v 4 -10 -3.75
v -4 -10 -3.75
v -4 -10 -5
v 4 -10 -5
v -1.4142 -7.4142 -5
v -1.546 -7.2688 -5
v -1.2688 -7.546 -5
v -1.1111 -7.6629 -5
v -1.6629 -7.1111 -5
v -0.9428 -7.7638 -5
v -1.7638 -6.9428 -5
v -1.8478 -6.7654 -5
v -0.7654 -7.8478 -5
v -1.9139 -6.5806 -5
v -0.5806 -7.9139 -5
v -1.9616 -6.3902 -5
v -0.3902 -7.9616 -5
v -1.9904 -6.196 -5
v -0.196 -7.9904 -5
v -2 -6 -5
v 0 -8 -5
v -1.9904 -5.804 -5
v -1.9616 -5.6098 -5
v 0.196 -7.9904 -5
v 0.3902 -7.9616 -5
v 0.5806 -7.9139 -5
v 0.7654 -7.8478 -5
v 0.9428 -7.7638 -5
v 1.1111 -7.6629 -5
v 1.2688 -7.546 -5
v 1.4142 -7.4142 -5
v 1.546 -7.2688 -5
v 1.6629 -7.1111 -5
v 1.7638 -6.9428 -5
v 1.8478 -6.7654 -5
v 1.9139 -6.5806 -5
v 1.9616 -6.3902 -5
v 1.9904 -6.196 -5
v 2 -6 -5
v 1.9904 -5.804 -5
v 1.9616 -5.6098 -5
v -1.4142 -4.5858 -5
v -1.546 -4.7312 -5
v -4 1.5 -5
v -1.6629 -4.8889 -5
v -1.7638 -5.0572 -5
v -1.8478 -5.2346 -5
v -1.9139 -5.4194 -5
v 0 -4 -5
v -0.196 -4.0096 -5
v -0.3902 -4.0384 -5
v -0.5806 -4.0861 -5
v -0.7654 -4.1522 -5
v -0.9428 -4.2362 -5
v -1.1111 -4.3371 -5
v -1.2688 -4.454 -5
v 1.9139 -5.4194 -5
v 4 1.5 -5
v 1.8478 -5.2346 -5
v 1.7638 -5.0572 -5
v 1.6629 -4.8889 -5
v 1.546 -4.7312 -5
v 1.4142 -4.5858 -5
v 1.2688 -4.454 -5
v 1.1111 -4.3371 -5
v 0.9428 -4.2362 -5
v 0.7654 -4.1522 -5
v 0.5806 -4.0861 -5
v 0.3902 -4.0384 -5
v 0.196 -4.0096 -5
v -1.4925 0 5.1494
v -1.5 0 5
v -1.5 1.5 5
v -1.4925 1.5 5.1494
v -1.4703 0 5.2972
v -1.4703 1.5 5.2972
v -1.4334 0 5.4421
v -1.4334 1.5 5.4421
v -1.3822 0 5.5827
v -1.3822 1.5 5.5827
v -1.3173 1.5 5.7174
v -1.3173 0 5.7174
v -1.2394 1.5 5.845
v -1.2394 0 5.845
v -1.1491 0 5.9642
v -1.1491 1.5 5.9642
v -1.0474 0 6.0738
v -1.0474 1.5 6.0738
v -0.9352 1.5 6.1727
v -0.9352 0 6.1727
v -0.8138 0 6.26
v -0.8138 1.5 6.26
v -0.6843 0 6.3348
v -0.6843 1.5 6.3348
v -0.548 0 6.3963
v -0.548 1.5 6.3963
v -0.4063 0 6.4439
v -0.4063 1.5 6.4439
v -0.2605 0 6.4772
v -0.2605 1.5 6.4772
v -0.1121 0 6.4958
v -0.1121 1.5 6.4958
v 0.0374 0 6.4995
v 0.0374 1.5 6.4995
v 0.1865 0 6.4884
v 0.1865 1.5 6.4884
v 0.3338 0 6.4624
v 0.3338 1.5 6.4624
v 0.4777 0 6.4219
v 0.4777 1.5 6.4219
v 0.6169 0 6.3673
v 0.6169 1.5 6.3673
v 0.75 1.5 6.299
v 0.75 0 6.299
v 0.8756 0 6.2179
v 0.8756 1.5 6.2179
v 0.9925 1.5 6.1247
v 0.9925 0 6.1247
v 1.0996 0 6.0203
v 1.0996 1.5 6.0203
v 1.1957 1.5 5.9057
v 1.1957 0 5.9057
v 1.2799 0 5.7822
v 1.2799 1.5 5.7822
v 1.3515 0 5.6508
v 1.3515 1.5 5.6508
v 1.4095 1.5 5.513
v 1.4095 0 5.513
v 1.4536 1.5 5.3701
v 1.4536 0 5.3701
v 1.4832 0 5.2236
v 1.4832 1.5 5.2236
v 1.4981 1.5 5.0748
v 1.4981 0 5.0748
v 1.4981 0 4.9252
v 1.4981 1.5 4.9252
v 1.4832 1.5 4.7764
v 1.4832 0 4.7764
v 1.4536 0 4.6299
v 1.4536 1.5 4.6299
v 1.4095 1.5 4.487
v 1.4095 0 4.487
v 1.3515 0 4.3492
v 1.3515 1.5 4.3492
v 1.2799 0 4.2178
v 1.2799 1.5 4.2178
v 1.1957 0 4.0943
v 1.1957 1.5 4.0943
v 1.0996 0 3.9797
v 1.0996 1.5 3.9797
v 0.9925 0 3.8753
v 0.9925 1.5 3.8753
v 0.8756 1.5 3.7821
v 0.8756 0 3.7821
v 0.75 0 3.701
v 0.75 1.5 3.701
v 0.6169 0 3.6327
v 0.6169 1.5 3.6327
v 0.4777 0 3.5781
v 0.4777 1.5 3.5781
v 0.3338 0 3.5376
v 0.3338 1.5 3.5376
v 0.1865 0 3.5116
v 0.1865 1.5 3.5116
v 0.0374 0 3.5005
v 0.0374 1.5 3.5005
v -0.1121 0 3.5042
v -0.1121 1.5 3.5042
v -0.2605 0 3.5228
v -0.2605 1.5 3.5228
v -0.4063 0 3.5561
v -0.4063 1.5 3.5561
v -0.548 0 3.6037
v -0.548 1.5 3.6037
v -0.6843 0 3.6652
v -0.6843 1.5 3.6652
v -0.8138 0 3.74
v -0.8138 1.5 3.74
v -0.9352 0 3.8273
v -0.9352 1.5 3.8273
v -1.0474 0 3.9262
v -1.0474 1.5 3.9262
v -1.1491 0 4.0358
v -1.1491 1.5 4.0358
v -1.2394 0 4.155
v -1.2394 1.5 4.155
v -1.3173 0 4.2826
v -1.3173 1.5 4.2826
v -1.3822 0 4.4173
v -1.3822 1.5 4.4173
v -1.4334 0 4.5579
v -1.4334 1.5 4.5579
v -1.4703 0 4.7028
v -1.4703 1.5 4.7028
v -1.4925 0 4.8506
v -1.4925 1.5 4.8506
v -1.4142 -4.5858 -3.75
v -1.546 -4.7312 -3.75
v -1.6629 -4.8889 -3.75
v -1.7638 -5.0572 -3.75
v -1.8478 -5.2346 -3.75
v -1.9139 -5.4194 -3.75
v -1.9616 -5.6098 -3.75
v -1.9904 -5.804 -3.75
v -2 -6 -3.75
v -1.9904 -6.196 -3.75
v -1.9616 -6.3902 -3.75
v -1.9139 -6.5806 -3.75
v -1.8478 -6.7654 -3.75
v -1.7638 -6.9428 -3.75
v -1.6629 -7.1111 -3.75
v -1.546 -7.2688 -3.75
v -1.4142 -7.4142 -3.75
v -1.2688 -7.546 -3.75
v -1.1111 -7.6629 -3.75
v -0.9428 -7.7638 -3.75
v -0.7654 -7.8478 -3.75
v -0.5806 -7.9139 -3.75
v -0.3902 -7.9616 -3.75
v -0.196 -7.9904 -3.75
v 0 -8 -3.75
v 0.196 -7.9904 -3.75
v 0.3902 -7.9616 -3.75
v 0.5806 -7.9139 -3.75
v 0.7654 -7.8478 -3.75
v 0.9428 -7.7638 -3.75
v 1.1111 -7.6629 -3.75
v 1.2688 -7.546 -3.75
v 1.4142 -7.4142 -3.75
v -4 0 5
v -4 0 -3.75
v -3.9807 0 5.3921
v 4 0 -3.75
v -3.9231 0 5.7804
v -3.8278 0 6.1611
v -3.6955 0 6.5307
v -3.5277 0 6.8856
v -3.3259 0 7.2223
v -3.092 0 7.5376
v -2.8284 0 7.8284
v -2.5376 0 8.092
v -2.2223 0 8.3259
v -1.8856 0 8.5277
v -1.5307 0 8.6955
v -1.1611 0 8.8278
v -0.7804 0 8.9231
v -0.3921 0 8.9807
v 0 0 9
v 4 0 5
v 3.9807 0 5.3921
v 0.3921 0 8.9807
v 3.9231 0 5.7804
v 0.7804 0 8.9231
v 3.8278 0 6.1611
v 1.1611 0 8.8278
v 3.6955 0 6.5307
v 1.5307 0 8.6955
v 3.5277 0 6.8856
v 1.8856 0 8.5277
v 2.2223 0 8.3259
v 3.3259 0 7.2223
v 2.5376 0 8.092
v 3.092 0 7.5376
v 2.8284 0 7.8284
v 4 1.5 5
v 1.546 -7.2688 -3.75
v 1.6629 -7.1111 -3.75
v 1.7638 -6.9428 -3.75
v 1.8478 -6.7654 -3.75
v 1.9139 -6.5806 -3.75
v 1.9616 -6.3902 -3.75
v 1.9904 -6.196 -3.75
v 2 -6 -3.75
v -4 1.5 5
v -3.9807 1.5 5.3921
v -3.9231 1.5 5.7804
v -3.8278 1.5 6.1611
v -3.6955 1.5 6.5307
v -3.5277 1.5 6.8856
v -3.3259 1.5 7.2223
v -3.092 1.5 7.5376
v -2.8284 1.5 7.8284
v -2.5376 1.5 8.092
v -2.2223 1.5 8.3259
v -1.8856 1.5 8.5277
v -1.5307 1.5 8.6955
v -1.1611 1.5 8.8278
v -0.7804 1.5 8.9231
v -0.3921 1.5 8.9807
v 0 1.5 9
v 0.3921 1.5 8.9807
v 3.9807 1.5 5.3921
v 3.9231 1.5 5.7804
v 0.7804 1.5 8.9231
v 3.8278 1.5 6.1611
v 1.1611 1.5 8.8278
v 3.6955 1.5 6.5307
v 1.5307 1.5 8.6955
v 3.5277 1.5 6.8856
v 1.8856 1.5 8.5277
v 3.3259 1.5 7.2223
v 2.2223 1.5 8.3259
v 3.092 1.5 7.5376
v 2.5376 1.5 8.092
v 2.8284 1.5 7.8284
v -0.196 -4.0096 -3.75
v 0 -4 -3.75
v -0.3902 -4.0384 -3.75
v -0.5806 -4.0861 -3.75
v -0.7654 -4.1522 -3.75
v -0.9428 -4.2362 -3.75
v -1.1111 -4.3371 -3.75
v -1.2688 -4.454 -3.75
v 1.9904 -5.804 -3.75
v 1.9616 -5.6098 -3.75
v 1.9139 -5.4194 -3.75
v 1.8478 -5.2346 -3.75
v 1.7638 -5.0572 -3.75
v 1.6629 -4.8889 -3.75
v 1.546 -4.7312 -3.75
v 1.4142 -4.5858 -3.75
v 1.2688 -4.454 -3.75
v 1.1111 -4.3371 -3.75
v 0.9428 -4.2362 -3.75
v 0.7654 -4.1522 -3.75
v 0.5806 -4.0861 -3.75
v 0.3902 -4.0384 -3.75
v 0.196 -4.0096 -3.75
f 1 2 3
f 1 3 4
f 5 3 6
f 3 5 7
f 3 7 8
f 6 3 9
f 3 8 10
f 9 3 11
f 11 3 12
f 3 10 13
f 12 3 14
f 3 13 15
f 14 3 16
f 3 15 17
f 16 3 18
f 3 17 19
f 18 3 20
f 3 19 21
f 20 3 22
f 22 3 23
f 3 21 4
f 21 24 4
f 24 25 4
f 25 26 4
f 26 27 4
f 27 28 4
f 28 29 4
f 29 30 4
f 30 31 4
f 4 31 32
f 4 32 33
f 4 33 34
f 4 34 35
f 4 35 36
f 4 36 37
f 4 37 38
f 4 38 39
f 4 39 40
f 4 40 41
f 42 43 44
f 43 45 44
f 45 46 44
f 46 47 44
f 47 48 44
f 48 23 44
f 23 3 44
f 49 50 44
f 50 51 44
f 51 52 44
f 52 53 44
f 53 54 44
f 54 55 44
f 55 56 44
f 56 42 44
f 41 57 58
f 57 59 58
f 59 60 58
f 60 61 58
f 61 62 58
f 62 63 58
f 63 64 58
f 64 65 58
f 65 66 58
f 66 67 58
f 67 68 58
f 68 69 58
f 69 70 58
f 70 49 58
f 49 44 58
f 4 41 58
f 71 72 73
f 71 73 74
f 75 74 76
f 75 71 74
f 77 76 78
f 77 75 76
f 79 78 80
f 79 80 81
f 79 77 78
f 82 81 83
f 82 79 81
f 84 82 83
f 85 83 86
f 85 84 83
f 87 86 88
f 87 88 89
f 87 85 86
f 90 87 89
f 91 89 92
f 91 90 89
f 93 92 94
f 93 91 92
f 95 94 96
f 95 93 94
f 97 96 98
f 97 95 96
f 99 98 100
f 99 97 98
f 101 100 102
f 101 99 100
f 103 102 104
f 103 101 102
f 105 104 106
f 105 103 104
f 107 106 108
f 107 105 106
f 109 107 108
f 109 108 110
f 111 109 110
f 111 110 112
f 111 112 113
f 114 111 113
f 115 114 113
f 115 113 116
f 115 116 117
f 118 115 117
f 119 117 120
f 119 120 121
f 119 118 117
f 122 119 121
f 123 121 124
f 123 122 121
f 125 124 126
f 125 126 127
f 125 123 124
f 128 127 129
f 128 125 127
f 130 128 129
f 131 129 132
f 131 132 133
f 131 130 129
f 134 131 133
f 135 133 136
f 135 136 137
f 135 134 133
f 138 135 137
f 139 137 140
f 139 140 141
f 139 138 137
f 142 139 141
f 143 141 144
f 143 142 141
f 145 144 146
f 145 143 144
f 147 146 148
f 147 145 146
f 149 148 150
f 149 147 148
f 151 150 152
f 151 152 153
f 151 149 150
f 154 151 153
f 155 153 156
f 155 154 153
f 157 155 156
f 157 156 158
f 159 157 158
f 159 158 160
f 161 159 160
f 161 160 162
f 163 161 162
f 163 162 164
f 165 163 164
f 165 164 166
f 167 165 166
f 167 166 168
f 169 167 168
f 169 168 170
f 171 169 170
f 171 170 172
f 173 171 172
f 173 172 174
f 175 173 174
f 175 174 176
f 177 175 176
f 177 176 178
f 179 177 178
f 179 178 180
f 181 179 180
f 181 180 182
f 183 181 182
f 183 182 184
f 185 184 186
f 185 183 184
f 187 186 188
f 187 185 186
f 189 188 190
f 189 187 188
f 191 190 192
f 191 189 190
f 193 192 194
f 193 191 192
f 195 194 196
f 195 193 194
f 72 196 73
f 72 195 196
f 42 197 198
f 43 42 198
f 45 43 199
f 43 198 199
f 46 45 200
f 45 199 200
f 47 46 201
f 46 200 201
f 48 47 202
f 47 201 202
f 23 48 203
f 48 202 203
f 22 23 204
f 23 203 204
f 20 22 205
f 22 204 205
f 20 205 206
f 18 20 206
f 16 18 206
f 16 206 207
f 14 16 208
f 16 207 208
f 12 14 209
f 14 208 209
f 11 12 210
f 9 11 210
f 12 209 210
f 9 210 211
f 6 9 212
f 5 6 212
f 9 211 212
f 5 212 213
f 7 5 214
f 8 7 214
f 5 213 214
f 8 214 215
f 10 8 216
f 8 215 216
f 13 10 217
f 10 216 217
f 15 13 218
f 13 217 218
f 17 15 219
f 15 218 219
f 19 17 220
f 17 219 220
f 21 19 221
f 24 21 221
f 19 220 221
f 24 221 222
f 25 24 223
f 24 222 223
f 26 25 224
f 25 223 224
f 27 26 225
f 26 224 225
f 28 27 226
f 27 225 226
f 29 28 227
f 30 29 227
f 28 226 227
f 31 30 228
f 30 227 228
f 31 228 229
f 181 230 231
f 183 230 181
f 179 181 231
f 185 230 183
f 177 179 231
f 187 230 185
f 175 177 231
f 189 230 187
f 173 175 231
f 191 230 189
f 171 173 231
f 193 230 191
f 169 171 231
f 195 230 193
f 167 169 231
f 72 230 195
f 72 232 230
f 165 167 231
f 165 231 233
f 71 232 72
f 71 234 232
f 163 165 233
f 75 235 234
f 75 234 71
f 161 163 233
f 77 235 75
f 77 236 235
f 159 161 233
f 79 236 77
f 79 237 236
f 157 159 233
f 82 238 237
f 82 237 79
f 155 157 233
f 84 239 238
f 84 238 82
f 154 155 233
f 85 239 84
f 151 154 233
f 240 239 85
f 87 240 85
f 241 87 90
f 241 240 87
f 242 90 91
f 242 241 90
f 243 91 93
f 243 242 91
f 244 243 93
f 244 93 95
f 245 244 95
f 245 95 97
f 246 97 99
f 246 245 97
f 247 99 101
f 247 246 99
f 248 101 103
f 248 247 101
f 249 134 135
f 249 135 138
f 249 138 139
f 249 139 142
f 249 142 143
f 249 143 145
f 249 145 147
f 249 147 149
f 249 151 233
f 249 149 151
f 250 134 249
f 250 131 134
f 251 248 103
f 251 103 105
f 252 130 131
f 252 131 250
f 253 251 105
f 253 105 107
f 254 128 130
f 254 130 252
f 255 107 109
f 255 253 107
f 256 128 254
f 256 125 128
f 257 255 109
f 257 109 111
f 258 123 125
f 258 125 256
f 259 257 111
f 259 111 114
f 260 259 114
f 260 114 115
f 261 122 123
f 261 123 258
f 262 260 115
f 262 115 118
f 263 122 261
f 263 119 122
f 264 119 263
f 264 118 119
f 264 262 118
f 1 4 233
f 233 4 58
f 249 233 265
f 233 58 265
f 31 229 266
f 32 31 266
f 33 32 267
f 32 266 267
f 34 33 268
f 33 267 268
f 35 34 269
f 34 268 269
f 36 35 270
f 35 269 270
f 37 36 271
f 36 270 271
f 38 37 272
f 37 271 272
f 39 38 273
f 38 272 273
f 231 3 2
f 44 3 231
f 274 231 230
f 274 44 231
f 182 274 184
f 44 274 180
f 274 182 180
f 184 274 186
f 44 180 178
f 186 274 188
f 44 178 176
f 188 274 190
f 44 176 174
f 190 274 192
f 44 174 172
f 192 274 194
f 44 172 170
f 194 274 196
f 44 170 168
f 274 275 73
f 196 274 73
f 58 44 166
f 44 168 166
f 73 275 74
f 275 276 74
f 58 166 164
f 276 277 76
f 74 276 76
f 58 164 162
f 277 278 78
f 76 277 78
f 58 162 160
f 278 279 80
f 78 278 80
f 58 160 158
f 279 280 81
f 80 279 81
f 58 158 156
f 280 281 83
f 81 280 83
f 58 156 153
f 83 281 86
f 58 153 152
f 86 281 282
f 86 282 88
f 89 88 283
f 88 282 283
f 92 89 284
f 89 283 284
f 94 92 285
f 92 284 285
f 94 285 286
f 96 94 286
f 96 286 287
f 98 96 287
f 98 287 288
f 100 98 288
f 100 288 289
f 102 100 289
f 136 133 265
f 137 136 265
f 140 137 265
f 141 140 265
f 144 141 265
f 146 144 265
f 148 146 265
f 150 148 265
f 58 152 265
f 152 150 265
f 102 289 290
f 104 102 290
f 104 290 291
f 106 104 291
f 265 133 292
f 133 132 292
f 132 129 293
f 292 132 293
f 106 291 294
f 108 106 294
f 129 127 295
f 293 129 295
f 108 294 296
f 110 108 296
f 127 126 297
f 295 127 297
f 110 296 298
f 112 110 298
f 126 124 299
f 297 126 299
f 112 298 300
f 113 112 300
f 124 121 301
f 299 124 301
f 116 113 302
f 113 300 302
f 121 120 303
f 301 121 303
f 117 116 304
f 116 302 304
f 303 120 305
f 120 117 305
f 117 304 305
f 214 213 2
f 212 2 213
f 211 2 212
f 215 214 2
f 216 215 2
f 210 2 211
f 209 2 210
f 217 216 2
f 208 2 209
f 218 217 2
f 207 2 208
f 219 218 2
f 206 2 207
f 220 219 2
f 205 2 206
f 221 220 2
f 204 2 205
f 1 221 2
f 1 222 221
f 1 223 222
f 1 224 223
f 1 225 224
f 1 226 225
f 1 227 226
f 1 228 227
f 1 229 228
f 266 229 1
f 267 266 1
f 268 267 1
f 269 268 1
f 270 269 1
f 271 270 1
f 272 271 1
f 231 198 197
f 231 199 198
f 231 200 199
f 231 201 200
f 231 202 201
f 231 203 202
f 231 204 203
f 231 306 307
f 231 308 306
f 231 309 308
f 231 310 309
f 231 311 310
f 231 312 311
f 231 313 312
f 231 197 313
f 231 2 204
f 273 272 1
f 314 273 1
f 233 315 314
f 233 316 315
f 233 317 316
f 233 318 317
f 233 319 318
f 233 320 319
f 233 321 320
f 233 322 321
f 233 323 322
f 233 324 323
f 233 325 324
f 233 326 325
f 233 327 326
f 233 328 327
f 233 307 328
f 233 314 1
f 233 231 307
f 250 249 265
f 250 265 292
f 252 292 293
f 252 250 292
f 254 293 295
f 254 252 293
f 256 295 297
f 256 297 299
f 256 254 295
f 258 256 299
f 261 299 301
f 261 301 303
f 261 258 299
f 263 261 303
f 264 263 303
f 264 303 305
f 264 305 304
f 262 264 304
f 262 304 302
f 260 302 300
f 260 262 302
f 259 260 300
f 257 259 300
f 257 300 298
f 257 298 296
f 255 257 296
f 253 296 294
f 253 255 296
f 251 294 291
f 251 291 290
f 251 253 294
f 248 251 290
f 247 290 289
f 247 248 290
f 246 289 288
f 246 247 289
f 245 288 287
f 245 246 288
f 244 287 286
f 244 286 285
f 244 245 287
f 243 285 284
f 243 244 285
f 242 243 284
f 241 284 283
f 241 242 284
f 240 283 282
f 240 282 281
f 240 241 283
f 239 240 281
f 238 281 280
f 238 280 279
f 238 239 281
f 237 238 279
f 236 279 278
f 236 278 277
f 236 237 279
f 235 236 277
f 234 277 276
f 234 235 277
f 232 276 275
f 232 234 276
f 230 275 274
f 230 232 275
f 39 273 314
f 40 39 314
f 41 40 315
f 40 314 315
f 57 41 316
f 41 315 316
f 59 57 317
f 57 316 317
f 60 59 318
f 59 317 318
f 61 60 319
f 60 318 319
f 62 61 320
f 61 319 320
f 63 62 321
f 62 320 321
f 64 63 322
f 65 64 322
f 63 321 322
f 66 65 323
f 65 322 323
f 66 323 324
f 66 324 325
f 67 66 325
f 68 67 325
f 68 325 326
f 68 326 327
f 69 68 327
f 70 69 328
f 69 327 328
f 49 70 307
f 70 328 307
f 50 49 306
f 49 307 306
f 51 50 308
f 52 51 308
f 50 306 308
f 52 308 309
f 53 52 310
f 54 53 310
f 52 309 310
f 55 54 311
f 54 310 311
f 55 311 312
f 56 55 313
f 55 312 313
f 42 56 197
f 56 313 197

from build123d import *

# Parameters (mm, degrees)
F0_W     = 8
F0_H     = 1.25
F1_DEPTH = 1.5
F2_DEPTH = 10
F4_DEPTH = 1.25


with BuildPart() as f1:
    # F0 (on Front) → F1 (new body)
    with BuildSketch(Plane.XZ):
        with BuildLine():
            Line((4, 5), (1.5, 5))
            ThreePointArc((1.5, 5), (0, 3.5), (-1.5, 5))
            Line((-1.5, 5), (-4, 5))
            Line((-4, 5), (-4, -3.75))
            Line((-4, -3.75), (4, -3.75))
            Line((4, -3.75), (4, 5))
        make_face()
        with Locations((0, -4.375)):
            Rectangle(F0_W, F0_H)
        with BuildLine():
            ThreePointArc((-1.5, 5), (0, 6.5), (1.5, 5))
            Line((1.5, 5), (4, 5))
            ThreePointArc((4, 5), (0, 9), (-4, 5))
            Line((-4, 5), (-1.5, 5))
        make_face()
    extrude(amount=-F1_DEPTH)

    # F0 (on Front) → F2 (join)
    with BuildSketch(Plane.XZ):
        with Locations((0, -4.375)):
            Rectangle(F0_W, F0_H)
    extrude(amount=F2_DEPTH)

    # F3 (on face) → F4 (cut, through all)
    with BuildSketch(Plane.XY.offset(-3.75)):
        with BuildLine():
            Line((1.414214, -7.414214), (-1.414214, -4.585786))
            ThreePointArc((-1.414214, -4.585786), (-1.414214, -7.414214), (1.414214, -7.414214))
        make_face()
        with BuildLine():
            ThreePointArc((1.414214, -7.414214), (1.847759, -6.765367), (2, -6))
            ThreePointArc((2, -6), (0.765367, -4.152241), (-1.414214, -4.585786))
            Line((-1.414214, -4.585786), (1.414214, -7.414214))
        make_face()
    extrude(amount=-F4_DEPTH, mode=Mode.SUBTRACT)


solid = f1.part
